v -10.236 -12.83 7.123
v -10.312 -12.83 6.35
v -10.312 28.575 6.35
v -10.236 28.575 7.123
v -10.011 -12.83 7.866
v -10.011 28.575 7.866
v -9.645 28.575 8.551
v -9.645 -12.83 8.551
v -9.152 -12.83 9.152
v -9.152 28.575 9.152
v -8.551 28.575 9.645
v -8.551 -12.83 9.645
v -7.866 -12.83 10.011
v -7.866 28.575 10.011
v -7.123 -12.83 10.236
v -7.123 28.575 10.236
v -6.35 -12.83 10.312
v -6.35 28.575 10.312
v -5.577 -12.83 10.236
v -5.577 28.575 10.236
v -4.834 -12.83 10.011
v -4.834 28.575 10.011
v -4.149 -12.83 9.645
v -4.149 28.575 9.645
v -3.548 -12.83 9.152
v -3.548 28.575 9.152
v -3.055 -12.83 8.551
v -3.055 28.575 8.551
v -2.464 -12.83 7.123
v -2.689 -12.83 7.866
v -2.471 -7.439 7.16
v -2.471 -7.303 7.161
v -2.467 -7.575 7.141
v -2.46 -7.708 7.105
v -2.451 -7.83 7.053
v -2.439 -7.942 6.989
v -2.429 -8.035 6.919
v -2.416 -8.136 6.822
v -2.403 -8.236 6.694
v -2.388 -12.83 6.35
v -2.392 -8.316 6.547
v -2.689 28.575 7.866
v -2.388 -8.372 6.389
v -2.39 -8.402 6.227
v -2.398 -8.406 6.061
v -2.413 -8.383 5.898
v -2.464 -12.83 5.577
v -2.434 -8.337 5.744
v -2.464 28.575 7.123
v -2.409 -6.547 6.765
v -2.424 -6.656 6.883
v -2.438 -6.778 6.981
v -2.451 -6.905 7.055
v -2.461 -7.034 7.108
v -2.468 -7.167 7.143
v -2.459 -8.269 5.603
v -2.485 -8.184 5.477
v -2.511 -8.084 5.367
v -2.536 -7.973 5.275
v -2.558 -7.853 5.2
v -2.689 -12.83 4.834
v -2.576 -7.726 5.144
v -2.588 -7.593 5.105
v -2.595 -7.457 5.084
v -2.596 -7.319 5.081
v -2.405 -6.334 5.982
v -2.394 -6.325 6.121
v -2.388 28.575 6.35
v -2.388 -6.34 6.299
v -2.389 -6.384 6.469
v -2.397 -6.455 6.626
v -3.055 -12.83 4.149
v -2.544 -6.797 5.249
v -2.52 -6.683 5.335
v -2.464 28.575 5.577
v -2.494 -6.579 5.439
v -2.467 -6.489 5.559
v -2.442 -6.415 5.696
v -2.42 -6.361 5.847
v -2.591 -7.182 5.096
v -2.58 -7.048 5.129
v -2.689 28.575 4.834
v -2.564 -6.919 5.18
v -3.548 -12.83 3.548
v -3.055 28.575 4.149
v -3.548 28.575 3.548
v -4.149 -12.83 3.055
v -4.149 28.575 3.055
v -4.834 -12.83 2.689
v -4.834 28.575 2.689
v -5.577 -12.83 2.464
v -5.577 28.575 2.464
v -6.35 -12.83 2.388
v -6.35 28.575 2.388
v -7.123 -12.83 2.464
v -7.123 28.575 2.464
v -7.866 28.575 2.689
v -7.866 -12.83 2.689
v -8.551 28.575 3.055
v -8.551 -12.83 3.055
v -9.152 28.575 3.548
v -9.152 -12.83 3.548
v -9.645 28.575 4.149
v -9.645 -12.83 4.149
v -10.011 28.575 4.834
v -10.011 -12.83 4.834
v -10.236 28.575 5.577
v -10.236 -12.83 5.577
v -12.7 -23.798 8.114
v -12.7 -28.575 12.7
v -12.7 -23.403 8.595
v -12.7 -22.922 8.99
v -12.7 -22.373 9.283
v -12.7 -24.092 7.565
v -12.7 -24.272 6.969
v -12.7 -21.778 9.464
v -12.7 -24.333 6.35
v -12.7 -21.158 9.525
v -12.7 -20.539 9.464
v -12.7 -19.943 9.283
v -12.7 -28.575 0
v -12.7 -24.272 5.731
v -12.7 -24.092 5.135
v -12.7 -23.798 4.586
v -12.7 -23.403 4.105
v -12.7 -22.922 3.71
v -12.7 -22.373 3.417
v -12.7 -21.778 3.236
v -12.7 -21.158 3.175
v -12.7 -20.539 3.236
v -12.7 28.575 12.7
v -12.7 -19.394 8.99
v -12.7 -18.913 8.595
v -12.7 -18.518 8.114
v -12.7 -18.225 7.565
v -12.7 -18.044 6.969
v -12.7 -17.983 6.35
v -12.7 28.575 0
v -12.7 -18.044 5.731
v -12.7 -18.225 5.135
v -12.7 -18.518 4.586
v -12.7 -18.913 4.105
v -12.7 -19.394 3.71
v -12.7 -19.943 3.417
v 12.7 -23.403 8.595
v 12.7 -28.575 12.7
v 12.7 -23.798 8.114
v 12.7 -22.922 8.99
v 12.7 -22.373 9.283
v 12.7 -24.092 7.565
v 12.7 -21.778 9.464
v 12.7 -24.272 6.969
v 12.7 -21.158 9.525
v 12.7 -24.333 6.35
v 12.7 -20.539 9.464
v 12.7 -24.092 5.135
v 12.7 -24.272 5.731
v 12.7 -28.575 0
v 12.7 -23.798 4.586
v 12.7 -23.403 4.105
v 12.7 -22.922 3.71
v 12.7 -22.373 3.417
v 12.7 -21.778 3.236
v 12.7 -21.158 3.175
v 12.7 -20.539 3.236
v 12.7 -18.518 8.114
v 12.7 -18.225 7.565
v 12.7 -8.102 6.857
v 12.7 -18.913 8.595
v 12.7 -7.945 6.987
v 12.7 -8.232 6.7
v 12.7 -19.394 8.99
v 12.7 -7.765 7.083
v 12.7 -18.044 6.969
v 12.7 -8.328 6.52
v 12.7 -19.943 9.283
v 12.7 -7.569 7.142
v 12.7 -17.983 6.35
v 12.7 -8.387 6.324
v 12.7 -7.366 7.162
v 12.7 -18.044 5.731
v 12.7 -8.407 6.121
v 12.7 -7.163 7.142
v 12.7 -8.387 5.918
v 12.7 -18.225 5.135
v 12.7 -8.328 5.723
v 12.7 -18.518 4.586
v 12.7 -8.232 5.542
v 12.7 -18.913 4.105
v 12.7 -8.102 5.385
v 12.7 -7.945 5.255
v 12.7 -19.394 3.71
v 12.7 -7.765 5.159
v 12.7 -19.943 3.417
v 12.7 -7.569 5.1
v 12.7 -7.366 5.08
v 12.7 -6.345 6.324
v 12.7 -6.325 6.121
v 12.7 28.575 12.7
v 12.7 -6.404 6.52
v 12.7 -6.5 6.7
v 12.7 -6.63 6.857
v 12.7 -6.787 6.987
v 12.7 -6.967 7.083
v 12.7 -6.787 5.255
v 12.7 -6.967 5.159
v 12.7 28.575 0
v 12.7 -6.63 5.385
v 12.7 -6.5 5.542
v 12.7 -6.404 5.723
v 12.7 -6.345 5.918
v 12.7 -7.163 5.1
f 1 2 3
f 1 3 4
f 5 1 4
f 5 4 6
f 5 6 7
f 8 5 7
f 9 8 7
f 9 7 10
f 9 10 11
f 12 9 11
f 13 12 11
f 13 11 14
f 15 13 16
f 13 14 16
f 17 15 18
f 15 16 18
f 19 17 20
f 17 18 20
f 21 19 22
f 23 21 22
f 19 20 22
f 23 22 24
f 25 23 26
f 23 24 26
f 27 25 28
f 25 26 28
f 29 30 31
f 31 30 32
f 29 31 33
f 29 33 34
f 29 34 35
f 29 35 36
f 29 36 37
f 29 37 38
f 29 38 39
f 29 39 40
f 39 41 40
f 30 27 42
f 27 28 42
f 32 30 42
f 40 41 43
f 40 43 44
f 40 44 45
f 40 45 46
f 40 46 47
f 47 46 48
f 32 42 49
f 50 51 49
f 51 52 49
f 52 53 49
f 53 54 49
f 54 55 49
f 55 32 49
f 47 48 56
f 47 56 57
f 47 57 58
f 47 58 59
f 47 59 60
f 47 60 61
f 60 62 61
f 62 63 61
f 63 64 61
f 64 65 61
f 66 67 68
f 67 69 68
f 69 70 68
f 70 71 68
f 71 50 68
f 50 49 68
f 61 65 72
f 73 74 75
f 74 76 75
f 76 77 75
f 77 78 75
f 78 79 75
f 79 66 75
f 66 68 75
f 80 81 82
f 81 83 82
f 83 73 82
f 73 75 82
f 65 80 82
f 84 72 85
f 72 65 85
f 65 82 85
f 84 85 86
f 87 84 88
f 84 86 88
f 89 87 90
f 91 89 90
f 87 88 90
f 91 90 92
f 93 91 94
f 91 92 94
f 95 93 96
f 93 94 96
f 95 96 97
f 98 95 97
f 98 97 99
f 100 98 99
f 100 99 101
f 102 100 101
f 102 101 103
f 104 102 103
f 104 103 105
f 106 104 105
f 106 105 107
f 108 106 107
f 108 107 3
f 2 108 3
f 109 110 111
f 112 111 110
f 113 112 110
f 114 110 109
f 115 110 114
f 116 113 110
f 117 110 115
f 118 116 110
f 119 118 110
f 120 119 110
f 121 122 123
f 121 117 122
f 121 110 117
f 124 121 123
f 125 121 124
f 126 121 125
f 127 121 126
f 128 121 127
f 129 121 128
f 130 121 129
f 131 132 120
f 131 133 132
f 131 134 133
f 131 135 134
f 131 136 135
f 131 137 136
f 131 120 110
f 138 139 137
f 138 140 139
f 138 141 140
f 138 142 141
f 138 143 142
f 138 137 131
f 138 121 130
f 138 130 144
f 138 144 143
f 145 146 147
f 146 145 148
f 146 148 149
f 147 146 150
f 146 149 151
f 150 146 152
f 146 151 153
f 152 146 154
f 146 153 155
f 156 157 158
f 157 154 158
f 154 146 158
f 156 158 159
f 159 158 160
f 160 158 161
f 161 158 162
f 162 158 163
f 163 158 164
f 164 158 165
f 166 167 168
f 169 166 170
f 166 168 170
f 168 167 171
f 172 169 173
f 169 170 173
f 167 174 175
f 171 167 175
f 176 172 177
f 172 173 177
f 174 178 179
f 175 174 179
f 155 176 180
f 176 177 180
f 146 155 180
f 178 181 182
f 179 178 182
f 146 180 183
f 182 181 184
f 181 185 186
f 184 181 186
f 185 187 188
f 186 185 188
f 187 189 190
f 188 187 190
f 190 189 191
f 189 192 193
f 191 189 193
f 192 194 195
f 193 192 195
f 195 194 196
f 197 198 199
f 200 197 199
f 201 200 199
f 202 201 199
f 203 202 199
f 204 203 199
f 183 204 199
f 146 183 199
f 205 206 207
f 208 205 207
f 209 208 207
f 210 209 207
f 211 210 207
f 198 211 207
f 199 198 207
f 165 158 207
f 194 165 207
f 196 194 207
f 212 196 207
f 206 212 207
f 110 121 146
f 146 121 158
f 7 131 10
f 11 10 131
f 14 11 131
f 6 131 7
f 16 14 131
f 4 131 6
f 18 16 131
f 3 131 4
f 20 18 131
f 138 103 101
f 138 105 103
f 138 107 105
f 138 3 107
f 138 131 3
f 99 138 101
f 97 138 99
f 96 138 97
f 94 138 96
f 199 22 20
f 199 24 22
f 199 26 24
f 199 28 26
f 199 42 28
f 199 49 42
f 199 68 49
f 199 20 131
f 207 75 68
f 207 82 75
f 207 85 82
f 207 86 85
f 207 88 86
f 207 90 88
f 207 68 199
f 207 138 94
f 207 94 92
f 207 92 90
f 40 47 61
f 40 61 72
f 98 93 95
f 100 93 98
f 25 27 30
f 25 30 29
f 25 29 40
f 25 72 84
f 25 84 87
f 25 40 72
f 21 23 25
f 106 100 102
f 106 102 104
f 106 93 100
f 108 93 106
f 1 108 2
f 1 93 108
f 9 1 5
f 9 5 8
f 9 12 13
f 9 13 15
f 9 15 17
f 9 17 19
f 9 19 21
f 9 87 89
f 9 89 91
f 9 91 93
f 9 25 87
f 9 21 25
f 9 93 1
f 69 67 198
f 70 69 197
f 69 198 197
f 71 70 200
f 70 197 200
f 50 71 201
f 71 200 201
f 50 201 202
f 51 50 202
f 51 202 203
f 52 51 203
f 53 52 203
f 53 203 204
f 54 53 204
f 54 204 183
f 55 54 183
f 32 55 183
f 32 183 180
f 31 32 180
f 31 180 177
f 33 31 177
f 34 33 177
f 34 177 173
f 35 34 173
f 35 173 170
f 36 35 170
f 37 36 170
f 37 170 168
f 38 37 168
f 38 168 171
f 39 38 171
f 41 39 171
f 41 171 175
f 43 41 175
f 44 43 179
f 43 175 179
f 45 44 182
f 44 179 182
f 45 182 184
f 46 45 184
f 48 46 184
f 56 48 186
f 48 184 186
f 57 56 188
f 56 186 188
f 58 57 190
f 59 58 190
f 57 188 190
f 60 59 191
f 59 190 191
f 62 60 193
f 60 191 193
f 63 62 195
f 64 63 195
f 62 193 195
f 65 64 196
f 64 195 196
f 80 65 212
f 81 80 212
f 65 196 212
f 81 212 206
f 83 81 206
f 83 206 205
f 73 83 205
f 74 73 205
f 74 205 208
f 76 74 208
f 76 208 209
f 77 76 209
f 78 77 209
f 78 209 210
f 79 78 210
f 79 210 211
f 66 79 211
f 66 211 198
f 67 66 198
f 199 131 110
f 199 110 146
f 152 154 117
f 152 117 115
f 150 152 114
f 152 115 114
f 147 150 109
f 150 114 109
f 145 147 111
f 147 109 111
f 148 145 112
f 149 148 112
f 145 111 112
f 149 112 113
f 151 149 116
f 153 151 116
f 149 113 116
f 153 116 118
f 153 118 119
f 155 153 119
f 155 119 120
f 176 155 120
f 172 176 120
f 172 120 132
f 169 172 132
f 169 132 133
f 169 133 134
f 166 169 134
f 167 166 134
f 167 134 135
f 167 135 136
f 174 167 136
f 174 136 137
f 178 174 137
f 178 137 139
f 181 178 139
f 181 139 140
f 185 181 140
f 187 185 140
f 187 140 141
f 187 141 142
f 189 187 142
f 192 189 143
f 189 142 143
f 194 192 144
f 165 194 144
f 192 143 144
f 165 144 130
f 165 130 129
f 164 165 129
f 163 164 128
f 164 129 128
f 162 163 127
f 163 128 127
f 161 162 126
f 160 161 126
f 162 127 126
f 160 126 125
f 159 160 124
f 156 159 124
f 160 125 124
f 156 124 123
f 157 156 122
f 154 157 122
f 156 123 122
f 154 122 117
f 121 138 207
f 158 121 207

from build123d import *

# Parameters (mm, degrees)
F0_W     = 25.4
F0_H     = 57.15
F1_DEPTH = 12.7
F2_R     = 3.175
F3_DEPTH = 30.8102
F4_R     = 3.9624
F5_DEPTH = 41.40454
F6_R     = 1.0414
F7_DEPTH = 16.9418


with BuildPart() as f1:
    # F0 (on Top) → F1 (new body)
    with BuildSketch(Plane.XY):
        Rectangle(F0_W, F0_H)
    extrude(amount=F1_DEPTH)

    # F2 (on face) → F3 (cut)
    with BuildSketch(Plane(origin=(-12.7, 0, 0), x_dir=(0, -1, 0), z_dir=(-1, 0, 0))):
        with Locations((21.1582, 6.35)):
            Circle(F2_R)
    extrude(amount=-F3_DEPTH, mode=Mode.SUBTRACT)

    # F4 (on face) → F5 (cut)
    with BuildSketch(Plane(origin=(0, 28.575, 0), x_dir=(-1, 0, 0), z_dir=(0, 1, 0))):
        with Locations((6.35, 6.35)):
            Circle(F4_R)
    extrude(amount=-F5_DEPTH, mode=Mode.SUBTRACT)

    # F6 (on face) → F7 (cut)
    with BuildSketch(Plane.YZ.offset(12.7)):
        with Locations((-7.366, 6.121051)):
            Circle(F6_R)
    extrude(amount=-F7_DEPTH, mode=Mode.SUBTRACT)


solid = f1.part
